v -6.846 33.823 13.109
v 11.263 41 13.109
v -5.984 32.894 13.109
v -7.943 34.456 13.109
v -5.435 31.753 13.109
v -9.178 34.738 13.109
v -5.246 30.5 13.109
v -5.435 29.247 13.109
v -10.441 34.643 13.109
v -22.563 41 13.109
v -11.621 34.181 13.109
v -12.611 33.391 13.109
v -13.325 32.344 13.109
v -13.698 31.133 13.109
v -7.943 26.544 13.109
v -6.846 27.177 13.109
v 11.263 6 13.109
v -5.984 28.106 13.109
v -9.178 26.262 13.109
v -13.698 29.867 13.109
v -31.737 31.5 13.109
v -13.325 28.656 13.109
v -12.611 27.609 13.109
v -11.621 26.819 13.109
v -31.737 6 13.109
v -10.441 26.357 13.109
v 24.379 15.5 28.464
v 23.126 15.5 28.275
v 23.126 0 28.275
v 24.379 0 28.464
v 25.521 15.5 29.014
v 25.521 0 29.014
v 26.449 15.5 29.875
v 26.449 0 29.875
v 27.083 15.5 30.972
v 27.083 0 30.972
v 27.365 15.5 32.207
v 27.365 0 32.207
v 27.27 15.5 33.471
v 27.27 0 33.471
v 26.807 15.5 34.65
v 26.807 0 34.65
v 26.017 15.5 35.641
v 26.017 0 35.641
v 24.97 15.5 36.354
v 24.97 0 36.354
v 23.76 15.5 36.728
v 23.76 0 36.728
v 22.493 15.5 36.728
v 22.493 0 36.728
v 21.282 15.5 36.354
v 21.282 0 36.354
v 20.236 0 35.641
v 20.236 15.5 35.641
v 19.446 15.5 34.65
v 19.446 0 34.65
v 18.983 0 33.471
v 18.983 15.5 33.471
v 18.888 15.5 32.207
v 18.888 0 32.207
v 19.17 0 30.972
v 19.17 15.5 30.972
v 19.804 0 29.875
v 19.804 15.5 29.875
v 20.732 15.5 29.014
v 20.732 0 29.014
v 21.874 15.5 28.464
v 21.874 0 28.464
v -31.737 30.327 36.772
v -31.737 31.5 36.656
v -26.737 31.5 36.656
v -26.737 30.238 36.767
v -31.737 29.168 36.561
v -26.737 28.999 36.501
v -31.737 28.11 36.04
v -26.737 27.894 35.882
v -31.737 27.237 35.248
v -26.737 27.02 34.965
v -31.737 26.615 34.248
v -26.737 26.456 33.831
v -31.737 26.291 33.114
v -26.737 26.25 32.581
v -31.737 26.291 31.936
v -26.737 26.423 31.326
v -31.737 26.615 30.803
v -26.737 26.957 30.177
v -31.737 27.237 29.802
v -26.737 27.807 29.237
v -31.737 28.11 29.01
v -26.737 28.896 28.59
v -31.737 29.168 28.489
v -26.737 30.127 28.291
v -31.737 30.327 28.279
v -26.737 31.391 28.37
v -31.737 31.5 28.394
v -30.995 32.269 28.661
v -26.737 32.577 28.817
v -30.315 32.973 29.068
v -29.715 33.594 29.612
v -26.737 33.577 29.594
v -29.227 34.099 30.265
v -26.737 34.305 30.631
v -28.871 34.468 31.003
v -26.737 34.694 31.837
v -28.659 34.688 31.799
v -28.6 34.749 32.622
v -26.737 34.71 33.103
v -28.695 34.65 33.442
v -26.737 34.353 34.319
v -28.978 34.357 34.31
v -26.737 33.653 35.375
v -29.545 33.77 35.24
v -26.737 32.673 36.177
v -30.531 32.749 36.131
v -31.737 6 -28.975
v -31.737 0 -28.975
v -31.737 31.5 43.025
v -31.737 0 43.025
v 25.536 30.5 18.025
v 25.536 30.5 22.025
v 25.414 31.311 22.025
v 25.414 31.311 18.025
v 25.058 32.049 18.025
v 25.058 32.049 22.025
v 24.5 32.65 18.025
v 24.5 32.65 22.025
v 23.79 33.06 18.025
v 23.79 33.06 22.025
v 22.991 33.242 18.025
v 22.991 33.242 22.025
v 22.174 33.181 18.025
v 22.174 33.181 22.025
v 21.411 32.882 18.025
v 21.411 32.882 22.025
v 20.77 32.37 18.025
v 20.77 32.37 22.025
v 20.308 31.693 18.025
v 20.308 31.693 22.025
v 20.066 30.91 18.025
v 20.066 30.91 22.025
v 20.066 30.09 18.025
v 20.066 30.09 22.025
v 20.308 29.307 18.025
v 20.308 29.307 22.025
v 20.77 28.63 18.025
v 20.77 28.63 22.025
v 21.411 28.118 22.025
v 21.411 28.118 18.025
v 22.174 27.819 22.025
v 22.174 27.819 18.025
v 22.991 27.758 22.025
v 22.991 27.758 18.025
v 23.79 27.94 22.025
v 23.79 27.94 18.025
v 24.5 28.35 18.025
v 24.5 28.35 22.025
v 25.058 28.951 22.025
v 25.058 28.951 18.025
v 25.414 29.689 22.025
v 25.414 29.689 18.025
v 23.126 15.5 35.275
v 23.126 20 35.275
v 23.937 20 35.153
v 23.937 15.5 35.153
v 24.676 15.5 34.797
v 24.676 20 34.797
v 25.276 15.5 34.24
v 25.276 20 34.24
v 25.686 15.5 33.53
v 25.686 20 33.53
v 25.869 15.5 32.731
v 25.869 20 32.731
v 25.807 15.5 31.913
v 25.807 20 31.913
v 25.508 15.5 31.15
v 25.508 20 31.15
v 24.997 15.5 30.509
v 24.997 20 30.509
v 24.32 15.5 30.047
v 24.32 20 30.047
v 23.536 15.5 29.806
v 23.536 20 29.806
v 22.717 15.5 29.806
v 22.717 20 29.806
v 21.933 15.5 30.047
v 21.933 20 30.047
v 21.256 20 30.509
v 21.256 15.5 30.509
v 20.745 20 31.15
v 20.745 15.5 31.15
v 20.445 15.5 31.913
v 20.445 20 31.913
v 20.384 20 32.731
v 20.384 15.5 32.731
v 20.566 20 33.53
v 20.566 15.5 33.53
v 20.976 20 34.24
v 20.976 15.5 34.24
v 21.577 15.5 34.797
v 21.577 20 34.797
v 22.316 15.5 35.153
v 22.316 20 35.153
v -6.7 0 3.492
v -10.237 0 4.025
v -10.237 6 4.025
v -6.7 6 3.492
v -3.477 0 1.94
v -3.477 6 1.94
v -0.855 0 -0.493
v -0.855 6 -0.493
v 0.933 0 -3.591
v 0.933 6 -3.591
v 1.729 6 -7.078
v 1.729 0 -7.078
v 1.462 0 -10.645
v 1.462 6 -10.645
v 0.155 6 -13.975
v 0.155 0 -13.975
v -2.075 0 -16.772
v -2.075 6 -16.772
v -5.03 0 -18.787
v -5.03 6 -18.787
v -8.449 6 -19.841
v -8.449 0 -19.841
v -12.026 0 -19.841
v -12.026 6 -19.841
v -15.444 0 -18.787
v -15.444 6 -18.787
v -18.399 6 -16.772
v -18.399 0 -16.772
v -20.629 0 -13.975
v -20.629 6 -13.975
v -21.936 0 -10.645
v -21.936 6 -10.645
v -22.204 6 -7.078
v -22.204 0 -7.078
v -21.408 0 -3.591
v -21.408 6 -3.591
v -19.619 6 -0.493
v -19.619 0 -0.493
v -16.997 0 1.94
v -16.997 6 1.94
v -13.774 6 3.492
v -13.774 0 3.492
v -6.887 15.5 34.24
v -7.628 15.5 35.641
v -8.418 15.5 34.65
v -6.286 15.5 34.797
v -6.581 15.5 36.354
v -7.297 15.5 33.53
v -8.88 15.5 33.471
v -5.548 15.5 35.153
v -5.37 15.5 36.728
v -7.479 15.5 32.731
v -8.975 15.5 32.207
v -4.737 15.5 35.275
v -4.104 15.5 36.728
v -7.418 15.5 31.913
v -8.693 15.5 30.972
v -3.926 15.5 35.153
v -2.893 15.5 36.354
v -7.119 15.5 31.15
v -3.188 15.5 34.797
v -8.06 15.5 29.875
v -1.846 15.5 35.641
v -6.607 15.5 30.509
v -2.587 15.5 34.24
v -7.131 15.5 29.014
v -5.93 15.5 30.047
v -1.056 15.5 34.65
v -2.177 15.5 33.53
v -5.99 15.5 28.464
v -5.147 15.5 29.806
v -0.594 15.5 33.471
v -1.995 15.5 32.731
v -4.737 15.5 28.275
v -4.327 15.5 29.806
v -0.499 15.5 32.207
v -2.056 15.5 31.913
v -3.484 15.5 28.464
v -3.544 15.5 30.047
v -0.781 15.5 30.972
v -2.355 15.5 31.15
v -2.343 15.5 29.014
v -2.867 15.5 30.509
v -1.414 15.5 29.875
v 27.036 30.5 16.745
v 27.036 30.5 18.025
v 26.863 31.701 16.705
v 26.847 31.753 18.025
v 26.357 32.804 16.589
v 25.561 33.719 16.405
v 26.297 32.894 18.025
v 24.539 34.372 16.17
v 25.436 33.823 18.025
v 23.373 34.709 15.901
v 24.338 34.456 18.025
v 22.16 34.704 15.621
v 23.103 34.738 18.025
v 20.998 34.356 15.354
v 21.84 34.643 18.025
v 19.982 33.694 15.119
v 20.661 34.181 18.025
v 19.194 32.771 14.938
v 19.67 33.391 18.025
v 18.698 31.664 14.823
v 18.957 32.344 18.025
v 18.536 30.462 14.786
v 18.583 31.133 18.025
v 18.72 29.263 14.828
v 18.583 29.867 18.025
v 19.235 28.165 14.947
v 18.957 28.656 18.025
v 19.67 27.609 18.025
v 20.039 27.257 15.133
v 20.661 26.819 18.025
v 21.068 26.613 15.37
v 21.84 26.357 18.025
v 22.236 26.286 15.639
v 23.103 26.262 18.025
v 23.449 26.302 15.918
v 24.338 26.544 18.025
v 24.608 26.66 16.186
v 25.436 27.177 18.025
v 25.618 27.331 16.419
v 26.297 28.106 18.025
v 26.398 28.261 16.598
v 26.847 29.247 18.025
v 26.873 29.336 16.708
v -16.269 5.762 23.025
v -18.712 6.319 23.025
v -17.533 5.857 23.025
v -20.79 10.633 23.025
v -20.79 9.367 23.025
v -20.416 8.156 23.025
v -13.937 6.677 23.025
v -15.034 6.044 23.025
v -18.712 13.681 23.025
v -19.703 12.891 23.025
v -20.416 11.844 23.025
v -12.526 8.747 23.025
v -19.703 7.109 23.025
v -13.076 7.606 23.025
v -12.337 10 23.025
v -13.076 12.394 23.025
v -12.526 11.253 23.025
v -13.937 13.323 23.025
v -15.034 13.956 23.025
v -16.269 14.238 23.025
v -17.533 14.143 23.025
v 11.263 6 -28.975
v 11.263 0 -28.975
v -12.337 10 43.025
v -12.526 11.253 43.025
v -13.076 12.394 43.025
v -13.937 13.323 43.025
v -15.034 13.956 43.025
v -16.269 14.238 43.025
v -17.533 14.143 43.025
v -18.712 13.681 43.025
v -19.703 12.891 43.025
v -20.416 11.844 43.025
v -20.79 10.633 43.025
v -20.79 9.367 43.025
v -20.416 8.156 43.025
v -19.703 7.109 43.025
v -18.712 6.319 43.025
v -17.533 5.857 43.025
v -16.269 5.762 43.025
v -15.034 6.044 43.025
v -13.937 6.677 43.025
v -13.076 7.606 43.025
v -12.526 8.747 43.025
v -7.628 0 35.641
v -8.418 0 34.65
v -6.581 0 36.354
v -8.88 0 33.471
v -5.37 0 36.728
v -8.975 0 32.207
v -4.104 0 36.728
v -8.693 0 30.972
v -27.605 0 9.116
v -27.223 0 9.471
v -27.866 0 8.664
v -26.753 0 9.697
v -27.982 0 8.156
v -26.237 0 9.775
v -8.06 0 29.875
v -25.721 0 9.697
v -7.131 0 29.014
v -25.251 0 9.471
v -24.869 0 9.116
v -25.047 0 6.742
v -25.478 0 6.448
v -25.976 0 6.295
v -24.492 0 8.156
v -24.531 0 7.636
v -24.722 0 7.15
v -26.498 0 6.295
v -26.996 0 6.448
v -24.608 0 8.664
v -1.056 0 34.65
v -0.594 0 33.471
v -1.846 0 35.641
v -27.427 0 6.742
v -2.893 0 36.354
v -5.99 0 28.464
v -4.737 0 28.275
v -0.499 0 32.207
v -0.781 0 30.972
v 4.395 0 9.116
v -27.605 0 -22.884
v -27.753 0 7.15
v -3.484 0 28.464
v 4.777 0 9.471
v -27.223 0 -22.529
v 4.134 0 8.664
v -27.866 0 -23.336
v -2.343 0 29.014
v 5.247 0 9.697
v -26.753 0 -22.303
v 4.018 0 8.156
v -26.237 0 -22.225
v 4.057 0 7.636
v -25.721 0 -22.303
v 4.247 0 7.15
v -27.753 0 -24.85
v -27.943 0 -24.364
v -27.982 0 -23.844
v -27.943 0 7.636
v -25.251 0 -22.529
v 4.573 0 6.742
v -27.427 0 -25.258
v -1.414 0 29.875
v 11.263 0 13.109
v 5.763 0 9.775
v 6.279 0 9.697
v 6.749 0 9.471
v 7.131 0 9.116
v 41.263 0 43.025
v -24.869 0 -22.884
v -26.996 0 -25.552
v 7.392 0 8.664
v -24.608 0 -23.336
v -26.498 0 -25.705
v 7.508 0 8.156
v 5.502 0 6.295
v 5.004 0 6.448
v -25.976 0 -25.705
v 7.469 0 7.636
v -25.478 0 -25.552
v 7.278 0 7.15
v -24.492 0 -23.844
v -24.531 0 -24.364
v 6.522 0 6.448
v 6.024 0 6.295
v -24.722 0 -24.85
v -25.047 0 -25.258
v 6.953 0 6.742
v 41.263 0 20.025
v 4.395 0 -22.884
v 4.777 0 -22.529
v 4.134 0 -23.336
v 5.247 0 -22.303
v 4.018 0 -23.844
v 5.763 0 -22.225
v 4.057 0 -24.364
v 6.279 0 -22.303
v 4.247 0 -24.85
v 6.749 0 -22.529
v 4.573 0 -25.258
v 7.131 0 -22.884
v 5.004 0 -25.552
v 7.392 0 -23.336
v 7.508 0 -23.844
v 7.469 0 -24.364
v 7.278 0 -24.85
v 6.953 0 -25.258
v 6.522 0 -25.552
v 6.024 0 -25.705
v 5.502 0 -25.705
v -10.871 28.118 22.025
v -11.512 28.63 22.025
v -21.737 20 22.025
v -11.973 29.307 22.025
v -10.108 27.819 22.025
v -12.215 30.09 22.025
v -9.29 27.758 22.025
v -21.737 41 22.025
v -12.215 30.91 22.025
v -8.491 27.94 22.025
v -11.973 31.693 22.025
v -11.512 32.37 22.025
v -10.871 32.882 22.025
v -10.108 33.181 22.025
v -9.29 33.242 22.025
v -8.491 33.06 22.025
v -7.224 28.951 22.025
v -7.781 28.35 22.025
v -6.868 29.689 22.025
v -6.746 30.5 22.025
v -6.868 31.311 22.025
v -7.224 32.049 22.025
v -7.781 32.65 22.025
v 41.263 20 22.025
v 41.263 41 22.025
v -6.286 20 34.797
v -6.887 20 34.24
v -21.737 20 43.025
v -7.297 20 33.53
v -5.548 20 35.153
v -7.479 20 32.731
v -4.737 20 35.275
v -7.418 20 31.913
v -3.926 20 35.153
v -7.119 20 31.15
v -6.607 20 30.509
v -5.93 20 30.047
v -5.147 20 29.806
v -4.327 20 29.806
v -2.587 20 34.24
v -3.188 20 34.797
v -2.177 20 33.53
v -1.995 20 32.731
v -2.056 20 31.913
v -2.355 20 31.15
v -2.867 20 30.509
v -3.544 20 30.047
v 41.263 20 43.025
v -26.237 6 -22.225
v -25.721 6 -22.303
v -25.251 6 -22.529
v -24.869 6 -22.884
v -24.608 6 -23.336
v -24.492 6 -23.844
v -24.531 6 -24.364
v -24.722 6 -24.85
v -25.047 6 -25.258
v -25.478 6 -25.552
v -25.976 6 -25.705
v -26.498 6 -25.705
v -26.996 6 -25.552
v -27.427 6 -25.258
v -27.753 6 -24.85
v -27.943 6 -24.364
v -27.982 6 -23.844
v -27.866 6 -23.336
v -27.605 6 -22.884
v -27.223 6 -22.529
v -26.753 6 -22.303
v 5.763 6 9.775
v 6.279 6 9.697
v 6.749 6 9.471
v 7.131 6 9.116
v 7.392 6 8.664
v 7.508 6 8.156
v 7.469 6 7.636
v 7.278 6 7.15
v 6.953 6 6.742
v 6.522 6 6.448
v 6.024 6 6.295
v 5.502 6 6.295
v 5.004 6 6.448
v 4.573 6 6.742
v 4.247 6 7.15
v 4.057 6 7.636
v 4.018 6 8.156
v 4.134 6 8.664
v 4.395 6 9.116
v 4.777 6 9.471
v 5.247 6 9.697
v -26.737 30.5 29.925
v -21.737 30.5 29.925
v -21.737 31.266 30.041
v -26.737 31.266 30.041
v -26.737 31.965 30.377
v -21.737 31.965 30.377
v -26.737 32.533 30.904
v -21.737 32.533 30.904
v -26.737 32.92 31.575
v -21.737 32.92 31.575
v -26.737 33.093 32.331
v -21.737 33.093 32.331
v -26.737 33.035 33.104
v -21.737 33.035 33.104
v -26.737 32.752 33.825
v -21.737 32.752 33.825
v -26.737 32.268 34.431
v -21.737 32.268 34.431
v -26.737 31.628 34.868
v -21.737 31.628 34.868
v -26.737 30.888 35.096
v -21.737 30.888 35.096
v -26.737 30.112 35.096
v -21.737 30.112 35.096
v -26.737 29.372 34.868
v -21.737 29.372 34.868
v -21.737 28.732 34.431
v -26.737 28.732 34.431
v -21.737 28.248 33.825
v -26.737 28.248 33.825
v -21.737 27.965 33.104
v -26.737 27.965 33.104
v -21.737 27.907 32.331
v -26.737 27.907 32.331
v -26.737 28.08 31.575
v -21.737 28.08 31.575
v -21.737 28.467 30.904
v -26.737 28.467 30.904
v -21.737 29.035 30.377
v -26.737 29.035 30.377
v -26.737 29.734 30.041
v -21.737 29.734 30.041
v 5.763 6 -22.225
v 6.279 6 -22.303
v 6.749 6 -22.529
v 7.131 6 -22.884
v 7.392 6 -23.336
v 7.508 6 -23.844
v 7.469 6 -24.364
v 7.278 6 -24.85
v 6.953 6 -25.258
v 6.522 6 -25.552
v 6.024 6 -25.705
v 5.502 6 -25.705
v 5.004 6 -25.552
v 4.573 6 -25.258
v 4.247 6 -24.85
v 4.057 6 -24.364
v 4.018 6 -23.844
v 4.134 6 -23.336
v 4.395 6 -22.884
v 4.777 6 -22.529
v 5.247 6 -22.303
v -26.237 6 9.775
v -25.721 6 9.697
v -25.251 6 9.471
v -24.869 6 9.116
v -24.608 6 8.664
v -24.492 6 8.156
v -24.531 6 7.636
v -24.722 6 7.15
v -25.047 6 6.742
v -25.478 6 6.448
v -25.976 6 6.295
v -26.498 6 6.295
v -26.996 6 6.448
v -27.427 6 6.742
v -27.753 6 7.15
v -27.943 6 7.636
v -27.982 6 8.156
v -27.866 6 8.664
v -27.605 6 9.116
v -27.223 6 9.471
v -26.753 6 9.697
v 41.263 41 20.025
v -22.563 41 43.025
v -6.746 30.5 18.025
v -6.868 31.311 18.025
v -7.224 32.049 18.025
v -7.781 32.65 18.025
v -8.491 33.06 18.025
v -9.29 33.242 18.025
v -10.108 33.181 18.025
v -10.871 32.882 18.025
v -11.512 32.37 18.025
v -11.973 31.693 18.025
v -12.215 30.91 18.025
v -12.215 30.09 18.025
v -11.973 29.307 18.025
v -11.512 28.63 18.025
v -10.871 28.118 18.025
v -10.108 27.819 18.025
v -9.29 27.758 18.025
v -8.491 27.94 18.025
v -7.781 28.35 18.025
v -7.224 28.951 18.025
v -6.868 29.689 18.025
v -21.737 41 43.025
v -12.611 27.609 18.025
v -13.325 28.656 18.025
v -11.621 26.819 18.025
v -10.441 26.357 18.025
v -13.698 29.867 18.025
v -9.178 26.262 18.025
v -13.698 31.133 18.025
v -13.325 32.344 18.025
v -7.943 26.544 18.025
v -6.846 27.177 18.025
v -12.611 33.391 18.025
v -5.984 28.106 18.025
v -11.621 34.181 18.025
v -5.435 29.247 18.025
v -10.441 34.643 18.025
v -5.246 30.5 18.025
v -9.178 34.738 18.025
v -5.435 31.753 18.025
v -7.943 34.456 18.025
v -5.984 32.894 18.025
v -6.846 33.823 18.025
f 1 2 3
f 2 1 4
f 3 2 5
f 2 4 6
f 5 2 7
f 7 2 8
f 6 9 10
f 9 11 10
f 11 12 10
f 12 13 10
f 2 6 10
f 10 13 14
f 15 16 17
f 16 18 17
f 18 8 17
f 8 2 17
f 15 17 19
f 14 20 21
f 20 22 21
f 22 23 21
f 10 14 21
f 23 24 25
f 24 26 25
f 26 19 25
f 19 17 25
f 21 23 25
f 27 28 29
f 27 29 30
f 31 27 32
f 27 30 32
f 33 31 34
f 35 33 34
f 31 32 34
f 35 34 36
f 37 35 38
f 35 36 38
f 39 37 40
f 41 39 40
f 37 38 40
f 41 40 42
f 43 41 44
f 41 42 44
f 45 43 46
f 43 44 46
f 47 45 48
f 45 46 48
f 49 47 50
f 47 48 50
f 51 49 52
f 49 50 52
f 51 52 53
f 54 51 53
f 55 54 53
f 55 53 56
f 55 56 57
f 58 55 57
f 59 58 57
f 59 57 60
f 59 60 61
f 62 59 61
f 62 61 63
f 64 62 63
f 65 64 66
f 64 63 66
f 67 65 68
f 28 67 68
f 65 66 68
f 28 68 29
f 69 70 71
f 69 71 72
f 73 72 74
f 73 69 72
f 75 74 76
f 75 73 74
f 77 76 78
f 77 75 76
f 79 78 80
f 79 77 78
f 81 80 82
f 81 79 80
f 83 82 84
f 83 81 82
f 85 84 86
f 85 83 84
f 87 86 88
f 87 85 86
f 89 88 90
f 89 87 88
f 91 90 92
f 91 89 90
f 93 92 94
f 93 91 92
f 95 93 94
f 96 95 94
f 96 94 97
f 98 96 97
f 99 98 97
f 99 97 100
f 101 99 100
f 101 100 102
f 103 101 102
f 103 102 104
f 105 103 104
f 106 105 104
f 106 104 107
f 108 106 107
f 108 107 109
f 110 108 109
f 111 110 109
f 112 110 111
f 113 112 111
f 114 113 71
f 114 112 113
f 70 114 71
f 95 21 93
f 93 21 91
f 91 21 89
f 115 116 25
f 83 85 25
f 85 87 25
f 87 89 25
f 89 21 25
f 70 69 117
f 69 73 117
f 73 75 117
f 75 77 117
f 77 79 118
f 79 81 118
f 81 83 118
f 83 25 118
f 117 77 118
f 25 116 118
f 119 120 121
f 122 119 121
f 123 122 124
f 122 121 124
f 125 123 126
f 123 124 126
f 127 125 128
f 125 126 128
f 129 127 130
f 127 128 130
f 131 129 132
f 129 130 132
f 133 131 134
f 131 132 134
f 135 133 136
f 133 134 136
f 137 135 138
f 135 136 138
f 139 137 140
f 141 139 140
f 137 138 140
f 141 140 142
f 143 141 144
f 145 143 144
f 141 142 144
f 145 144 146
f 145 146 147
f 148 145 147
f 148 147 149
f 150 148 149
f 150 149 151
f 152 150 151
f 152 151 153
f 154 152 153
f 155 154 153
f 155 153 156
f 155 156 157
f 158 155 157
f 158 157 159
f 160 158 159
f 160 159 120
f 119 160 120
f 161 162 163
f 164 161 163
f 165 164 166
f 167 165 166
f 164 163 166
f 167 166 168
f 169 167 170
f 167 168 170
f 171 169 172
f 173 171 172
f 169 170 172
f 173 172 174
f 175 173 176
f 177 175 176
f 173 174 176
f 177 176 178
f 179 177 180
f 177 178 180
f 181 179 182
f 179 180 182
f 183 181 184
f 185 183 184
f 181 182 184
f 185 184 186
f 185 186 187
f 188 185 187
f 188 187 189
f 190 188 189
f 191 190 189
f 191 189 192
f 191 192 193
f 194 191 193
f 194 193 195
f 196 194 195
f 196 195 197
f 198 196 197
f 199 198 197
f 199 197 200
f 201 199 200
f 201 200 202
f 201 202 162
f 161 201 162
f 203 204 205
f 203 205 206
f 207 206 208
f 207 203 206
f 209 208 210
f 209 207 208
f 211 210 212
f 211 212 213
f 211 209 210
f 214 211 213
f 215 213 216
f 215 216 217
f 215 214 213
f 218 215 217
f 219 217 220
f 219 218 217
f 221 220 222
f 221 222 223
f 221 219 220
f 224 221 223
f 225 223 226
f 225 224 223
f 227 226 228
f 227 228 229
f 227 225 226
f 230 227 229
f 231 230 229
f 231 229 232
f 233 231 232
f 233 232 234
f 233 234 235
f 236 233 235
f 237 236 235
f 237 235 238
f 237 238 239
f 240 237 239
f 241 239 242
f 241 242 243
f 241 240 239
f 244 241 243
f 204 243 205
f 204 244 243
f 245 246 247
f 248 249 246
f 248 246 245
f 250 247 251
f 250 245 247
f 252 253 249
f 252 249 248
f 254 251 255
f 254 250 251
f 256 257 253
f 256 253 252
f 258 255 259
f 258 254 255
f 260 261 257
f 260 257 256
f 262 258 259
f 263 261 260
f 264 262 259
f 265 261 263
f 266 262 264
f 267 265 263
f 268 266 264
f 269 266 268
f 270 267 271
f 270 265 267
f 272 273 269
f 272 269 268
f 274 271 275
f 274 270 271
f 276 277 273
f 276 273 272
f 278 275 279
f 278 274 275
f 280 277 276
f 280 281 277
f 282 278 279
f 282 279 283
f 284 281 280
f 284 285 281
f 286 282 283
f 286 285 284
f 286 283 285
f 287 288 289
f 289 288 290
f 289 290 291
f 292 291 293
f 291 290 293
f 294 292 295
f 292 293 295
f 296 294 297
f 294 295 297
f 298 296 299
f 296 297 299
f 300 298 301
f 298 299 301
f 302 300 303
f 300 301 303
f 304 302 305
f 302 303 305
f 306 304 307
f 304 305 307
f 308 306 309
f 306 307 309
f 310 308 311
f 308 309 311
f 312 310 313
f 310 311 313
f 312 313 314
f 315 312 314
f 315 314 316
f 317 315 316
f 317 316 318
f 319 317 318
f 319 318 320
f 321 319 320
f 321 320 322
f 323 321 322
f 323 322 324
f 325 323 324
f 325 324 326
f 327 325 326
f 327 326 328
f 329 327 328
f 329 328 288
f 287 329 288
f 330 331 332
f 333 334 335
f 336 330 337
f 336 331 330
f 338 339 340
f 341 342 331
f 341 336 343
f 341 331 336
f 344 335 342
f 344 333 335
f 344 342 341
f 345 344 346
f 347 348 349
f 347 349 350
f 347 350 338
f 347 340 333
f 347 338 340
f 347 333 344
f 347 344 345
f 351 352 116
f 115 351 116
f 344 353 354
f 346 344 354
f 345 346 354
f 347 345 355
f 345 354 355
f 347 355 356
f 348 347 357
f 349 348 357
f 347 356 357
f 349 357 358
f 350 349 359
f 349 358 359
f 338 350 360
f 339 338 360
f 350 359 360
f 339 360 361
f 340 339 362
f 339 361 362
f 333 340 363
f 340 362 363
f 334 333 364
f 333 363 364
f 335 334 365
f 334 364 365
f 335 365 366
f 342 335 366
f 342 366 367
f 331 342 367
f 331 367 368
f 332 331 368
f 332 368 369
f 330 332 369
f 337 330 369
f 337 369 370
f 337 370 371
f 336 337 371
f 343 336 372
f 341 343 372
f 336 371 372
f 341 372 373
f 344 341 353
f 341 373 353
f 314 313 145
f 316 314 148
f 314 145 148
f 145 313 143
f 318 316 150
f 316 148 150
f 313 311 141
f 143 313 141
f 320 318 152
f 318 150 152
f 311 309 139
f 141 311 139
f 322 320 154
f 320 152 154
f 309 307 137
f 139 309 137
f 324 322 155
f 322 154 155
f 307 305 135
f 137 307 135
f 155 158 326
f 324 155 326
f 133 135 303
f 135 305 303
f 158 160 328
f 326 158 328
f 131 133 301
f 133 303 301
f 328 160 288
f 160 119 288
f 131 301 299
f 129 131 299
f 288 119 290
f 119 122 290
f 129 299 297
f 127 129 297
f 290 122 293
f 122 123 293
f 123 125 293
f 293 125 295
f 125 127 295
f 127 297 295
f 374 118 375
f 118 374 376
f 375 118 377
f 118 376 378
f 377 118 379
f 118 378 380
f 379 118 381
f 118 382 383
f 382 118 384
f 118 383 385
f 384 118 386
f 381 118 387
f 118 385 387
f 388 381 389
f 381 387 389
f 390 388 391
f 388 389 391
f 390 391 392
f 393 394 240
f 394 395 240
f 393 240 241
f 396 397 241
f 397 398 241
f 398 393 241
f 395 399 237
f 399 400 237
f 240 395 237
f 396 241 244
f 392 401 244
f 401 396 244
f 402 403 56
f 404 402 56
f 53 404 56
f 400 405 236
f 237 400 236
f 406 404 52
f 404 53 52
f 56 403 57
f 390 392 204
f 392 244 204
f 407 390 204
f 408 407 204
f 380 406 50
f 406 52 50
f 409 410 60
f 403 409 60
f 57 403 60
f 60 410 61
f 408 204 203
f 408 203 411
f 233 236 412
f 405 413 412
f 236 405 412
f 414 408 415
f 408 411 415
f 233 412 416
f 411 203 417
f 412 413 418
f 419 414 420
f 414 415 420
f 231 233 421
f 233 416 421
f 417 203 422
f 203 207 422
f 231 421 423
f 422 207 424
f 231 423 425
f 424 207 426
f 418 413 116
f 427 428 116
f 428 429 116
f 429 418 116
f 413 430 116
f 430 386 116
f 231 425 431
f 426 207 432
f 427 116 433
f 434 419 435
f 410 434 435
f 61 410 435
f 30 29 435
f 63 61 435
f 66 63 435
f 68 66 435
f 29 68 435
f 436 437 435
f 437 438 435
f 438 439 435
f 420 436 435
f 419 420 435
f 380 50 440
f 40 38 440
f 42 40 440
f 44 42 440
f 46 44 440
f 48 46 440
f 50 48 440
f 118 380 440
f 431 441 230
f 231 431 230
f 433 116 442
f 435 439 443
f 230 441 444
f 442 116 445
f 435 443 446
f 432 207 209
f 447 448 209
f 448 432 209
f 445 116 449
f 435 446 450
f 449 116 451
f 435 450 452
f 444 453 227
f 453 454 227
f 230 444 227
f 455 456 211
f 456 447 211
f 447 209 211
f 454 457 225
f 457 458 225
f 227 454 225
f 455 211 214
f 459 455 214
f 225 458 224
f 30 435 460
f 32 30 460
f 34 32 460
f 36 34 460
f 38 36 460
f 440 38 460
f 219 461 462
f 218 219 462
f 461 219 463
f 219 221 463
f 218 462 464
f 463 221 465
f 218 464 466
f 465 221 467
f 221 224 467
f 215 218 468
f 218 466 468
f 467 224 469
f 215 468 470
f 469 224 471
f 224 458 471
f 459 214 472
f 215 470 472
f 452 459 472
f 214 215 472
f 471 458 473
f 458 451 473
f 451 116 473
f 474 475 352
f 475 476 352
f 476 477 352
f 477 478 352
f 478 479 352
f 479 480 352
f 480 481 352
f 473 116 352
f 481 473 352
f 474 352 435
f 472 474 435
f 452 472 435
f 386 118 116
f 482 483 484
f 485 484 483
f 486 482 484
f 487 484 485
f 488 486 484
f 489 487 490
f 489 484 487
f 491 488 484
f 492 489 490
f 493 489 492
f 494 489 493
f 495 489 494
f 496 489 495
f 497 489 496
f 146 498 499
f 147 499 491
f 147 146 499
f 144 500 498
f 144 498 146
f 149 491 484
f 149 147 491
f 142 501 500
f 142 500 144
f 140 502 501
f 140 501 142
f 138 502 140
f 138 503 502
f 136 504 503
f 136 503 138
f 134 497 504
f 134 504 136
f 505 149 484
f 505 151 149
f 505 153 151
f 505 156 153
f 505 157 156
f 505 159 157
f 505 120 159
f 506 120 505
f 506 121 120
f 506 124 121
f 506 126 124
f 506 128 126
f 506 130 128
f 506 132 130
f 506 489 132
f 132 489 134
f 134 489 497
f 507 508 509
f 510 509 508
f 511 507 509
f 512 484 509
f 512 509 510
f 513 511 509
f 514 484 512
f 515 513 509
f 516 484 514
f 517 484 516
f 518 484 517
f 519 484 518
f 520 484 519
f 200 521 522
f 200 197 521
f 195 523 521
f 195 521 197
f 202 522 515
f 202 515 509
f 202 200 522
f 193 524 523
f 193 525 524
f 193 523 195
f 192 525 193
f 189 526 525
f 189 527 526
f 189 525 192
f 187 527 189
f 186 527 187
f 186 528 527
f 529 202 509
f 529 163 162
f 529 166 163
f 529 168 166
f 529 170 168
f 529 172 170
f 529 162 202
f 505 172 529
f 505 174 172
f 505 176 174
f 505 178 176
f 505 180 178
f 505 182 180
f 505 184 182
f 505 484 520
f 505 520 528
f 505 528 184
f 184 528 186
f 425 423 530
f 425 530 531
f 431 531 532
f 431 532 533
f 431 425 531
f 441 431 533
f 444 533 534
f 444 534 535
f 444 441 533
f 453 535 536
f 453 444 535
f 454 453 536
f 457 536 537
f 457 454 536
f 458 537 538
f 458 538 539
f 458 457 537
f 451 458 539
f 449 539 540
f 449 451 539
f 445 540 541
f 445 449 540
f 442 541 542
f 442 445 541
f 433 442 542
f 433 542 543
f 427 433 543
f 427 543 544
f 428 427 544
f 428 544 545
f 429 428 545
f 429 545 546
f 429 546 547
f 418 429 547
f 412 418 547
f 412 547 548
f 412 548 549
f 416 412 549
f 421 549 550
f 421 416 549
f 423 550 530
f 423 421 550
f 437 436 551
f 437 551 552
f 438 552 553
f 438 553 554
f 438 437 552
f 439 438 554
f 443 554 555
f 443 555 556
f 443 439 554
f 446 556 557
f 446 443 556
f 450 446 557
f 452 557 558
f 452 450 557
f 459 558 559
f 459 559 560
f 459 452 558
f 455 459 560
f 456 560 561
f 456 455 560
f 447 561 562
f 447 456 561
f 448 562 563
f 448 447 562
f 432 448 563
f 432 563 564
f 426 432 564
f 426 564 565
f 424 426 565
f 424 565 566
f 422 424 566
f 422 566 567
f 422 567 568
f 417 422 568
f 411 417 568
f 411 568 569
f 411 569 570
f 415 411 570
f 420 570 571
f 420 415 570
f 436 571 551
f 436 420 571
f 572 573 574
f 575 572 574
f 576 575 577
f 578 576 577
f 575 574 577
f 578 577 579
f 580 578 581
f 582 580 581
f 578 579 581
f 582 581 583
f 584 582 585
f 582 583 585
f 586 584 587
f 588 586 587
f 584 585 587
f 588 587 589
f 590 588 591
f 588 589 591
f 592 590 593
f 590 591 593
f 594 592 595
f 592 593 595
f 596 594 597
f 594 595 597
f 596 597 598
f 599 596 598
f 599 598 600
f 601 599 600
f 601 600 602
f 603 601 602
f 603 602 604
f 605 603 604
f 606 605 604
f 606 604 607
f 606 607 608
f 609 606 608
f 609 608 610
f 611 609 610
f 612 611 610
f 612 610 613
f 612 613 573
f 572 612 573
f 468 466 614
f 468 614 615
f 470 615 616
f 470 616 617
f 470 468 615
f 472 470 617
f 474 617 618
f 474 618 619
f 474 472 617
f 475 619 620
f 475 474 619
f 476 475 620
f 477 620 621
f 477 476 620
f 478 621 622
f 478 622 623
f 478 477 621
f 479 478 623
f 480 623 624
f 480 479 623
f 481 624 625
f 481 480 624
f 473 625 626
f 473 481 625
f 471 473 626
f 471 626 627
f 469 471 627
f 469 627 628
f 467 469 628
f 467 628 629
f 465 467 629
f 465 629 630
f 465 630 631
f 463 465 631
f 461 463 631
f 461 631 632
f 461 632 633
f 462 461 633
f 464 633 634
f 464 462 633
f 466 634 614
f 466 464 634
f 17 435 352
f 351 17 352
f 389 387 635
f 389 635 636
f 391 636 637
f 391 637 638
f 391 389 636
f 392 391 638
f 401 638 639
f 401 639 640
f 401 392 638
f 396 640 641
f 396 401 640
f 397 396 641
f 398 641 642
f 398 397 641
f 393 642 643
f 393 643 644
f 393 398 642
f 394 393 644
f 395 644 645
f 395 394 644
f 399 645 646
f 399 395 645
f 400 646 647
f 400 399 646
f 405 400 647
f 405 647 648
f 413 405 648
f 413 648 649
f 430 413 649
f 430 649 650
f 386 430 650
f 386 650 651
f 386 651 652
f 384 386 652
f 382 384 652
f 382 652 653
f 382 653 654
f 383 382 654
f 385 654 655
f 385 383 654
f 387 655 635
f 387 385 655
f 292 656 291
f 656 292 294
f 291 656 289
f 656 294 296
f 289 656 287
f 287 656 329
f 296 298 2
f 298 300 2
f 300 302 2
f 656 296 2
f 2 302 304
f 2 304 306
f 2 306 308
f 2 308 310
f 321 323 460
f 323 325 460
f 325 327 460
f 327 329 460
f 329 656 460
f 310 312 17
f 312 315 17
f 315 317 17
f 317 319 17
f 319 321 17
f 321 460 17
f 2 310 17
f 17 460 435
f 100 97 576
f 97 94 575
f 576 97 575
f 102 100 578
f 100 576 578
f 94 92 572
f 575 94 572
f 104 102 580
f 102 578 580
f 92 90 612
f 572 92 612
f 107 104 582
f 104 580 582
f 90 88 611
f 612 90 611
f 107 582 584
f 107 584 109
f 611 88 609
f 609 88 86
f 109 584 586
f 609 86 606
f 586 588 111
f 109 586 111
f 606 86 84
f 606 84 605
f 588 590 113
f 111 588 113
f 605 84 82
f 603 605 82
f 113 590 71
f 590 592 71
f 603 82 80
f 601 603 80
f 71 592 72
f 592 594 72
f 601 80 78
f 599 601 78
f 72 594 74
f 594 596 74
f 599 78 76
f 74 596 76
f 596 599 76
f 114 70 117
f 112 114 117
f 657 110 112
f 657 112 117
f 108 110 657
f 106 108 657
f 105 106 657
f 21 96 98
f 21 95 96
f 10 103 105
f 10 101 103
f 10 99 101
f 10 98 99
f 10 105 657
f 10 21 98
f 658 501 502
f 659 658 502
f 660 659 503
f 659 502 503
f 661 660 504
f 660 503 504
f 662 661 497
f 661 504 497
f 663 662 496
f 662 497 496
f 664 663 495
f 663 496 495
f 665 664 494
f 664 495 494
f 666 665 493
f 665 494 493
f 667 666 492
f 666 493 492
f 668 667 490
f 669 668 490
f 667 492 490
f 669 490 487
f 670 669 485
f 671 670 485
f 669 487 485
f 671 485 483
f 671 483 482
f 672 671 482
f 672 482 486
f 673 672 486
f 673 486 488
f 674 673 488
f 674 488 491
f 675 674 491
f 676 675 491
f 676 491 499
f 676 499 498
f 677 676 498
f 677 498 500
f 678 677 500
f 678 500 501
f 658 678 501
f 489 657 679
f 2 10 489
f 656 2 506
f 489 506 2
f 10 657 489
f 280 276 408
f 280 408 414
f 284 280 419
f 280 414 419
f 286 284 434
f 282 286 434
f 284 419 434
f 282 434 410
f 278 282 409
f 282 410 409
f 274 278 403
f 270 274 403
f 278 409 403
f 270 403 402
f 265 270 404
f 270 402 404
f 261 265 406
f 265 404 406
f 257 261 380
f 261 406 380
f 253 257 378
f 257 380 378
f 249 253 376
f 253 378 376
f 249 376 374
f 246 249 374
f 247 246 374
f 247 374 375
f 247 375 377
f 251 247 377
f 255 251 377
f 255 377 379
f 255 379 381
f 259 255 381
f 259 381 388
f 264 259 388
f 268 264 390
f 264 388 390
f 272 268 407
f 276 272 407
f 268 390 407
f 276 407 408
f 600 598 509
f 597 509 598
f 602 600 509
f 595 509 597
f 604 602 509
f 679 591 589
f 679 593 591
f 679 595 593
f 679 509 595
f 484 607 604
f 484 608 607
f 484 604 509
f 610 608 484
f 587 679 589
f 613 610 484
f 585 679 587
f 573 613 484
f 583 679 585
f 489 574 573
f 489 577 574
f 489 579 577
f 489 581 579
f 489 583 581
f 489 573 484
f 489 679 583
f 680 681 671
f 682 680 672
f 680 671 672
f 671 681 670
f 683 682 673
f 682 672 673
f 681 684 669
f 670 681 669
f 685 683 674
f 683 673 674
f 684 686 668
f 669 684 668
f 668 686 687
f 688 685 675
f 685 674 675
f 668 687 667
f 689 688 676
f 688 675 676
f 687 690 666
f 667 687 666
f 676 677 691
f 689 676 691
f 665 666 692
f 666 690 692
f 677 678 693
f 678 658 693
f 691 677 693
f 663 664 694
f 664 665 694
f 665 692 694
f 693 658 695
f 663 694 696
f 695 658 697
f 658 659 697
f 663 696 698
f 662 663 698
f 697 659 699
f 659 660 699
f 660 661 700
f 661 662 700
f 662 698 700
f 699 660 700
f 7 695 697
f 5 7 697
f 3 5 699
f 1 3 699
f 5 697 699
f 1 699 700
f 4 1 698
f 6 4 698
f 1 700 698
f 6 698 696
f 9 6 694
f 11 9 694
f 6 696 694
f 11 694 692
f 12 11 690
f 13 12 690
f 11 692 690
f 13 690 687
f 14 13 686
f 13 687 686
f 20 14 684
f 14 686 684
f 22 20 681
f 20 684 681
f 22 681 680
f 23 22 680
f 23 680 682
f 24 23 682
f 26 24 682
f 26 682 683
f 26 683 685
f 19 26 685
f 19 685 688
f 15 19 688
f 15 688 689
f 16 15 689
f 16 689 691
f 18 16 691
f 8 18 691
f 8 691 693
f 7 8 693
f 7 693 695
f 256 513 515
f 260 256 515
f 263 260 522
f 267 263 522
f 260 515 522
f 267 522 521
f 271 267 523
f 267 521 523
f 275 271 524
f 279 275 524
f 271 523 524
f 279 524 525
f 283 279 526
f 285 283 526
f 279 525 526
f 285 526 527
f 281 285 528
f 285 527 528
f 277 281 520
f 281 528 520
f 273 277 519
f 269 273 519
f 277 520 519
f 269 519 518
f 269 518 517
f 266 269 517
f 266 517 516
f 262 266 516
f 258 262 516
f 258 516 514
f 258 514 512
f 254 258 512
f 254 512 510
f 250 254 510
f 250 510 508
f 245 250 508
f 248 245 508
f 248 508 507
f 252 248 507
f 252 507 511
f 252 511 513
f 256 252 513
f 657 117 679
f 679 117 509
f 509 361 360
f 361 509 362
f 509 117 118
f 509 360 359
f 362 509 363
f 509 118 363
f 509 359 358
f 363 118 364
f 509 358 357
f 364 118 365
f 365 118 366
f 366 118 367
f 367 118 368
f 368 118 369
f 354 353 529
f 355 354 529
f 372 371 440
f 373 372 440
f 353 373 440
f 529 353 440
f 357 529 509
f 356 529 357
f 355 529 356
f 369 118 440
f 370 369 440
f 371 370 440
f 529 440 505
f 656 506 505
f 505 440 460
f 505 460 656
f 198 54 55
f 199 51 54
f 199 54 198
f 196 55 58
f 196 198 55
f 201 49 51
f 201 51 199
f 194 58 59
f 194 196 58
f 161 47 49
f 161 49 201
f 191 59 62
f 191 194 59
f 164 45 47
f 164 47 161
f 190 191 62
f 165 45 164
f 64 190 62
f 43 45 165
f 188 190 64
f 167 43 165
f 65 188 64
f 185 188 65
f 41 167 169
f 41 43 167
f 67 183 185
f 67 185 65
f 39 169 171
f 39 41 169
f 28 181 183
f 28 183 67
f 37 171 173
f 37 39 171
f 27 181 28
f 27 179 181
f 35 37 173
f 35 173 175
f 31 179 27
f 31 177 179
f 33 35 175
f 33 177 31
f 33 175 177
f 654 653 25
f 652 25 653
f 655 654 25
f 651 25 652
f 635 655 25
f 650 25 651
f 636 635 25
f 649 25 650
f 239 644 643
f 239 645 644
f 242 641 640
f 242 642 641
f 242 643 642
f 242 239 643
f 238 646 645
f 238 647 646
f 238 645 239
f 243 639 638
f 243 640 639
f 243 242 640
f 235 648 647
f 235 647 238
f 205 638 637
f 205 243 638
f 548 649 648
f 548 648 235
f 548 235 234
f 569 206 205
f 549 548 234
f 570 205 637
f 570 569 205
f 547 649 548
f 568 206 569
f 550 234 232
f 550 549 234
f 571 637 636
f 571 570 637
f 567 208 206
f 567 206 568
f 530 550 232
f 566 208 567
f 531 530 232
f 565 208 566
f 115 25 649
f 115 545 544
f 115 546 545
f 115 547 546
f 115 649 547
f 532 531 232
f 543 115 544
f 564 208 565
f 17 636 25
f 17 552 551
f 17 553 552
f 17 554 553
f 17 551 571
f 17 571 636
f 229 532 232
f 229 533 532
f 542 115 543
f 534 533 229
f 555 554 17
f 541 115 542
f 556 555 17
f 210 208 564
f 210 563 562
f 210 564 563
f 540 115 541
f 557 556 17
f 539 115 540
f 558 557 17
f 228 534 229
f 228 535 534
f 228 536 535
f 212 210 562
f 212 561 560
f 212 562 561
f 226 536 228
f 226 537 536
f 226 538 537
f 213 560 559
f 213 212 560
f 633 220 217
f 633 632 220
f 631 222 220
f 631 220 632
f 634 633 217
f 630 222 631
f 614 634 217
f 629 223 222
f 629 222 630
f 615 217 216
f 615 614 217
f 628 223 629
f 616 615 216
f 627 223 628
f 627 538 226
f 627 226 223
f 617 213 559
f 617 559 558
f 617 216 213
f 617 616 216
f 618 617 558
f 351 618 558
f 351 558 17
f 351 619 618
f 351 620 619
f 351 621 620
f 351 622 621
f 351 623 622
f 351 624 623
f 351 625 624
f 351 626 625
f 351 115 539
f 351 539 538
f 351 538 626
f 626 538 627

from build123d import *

# Parameters (mm, degrees)
SKETCH_1_R          = 12
SKETCH_1_R_2        = 1.75
EXTRUDE_1_DEPTH     = 6
EXTRUDE_2_DEPTH     = 35
SKETCH_3_W          = 63
SKETCH_3_H          = 21
CUT_EXTRUDE_1_DEPTH = 21
SKETCH_4_R          = 2.6
CUT_EXTRUDE_2_DEPTH = 87.609201921
CHAMFER_1_SIZE      = 9.5
CHAMFER_1_SIZE_2    = 9.174043361
CUT_EXTRUDE_START   = -10
SKETCH_5_R          = 4.25
CUT_EXTRUDE_3_DEPTH = 5
SKETCH_6_R          = 2.75
CUT_EXTRUDE_4_DEPTH = 78.360370477
CUT_EXTRUDE_START_2 = -4
SKETCH_7_R          = 4.25
CUT_EXTRUDE_5_DEPTH = 5
SKETCH_8_R          = 2.75
CUT_EXTRUDE_6_DEPTH = 64.20427816
SKETCH_10_R         = 4.25
CUT_EXTRUDE_7_DEPTH = 15.5
SKETCH_11_R         = 4.25
CUT_EXTRUDE_8_DEPTH = 20


with BuildPart() as part:
    # Эскиз1 → Бобышка-Вытянуть1 (new body)
    with BuildSketch(Plane(origin=(0, 0, 0), x_dir=(1, 0, 0), z_dir=(0, 1, 0))):
        Polygon((-31.737099952, -43.025037564), (41.262900048, -43.025037564), (41.262900048, -20.025037564), (11.262900048, -13.109402144), (11.262900048, 28.974962436), (-31.737099952, 28.974962436), align=None)
        with Locations(Location((-10.237099952, 7.974962436, 0), (0, 0, 270))):
            Circle(SKETCH_1_R, mode=Mode.SUBTRACT)
        with Locations(Location((-26.237099952, 23.974962436, 0), (0, 0, 270))):
            Circle(SKETCH_1_R_2, mode=Mode.SUBTRACT)
        with Locations(Location((5.762900048, 23.974962436, 0), (0, 0, 270))):
            Circle(SKETCH_1_R_2, mode=Mode.SUBTRACT)
        with Locations(Location((5.762900048, -8.025037564, 0), (0, 0, 270))):
            Circle(SKETCH_1_R_2, mode=Mode.SUBTRACT)
        with Locations(Location((-26.237099952, -8.025037564, 0), (0, 0, 270))):
            Circle(SKETCH_1_R_2, mode=Mode.SUBTRACT)
    extrude(amount=EXTRUDE_1_DEPTH)

    # Эскиз2 → Бобышка-Вытянуть2 (add)
    with BuildSketch(Plane(origin=(0, 6, 0), x_dir=(1, 0, 0), z_dir=(0, 1, 0))):
        Polygon((41.262900048, -20.025037564), (11.262900048, -13.109402144), (-31.737099952, -13.109402144), (-31.737099952, -43.025037564), (41.262900048, -43.025037564), align=None)
    extrude(amount=EXTRUDE_2_DEPTH)

    # Эскиз3 → Вырез-Вытянуть1 (cut)
    with BuildSketch(Plane(origin=(0, 41, 0), x_dir=(1, 0, 0), z_dir=(0, 1, 0))):
        with Locations((9.762900048, -32.525037564)):
            Rectangle(SKETCH_3_W, SKETCH_3_H)
    extrude(amount=-CUT_EXTRUDE_1_DEPTH, mode=Mode.SUBTRACT)

    # Эскиз4 → Вырез-Вытянуть2 (cut, through all)
    with BuildSketch(Plane(origin=(-21.737099952, 0, 0), x_dir=(0, 0, -1), z_dir=(1, 0, 0))):
        with Locations((-32.525037564, 30.5)):
            Circle(SKETCH_4_R)
    extrude(amount=-CUT_EXTRUDE_2_DEPTH, mode=Mode.SUBTRACT)

    # Фаска1
    # the kernel refuses this chamfer: 9.5, 9.174043361 mm, written as the material it takes off along each edge
    with BuildSketch(Plane(origin=(-31.737099952, 41, -11.332881065), x_dir=(-0.026999337430198715, -0.9996354514413394, 0), z_dir=(0, 0, 1))) as chamfer_1_piece_1:
        Polygon((CHAMFER_1_SIZE * 0.999635451441, CHAMFER_1_SIZE * 0.0269993374302), (-CHAMFER_1_SIZE_2 * 0.0269993374292, CHAMFER_1_SIZE_2 * 0.999635451405), (0, 0), align=None)
    extrude(amount=78.800201839, mode=Mode.SUBTRACT)

    # Эскиз5 → Вырез-Вытянуть3 (cut)
    with BuildSketch(Plane(origin=(-21.737099952, 0, 0), x_dir=(0, 0, -1), z_dir=(1, 0, 0)).offset(CUT_EXTRUDE_START)):
        with Locations(Location((-32.525037564, 30.5, 0), (0, 0, 166.391039369))):
            Circle(SKETCH_5_R)
    extrude(amount=CUT_EXTRUDE_3_DEPTH, mode=Mode.SUBTRACT)

    # Эскиз6 → Вырез-Вытянуть4 (cut, through all)
    with BuildSketch(Plane.XY.offset(22.025037564)):
        with Locations((-9.495708976, 30.5)):
            Circle(SKETCH_6_R)
        with Locations((22.785725254, 30.5)):
            Circle(SKETCH_6_R)
    extrude(amount=-CUT_EXTRUDE_4_DEPTH, mode=Mode.SUBTRACT)

    # Эскиз7 → Вырез-Вытянуть5 (cut)
    with BuildSketch(Plane.XY.offset(22.025037564).offset(CUT_EXTRUDE_START_2)):
        with Locations((-9.495708976, 30.5)):
            Circle(SKETCH_7_R)
        with Locations((22.785725254, 30.5)):
            Circle(SKETCH_7_R)
    extrude(amount=-CUT_EXTRUDE_5_DEPTH, mode=Mode.SUBTRACT)

    # Эскиз8 → Вырез-Вытянуть6 (cut, through all)
    with BuildSketch(Plane(origin=(0, 20, 0), x_dir=(1, 0, 0), z_dir=(0, 1, 0))):
        with Locations(Location((-4.737013791, -32.525037564, 0), (0, 0, 270))):
            Circle(SKETCH_8_R)
        with Locations(Location((23.126402015, -32.525037564, 0), (0, 0, 270))):
            Circle(SKETCH_8_R)
    extrude(amount=-CUT_EXTRUDE_6_DEPTH, mode=Mode.SUBTRACT)

    # Эскиз10 → Вырез-Вытянуть7 (cut)
    with BuildSketch(Plane.XZ):
        with Locations(Location((23.126402015, 32.525037564, 0), (0, 0, 270))):
            Circle(SKETCH_10_R)
        with Locations(Location((-4.737013791, 32.525037564, 0), (0, 0, 270))):
            Circle(SKETCH_10_R)
    extrude(amount=-CUT_EXTRUDE_7_DEPTH, mode=Mode.SUBTRACT)

    # Эскиз11 → Вырез-Вытянуть8 (cut)
    with BuildSketch(Plane.XY.offset(43.025037564)):
        with Locations((-16.587099952, 10)):
            Circle(SKETCH_11_R)
    extrude(amount=-CUT_EXTRUDE_8_DEPTH, mode=Mode.SUBTRACT)


solid = part.part
